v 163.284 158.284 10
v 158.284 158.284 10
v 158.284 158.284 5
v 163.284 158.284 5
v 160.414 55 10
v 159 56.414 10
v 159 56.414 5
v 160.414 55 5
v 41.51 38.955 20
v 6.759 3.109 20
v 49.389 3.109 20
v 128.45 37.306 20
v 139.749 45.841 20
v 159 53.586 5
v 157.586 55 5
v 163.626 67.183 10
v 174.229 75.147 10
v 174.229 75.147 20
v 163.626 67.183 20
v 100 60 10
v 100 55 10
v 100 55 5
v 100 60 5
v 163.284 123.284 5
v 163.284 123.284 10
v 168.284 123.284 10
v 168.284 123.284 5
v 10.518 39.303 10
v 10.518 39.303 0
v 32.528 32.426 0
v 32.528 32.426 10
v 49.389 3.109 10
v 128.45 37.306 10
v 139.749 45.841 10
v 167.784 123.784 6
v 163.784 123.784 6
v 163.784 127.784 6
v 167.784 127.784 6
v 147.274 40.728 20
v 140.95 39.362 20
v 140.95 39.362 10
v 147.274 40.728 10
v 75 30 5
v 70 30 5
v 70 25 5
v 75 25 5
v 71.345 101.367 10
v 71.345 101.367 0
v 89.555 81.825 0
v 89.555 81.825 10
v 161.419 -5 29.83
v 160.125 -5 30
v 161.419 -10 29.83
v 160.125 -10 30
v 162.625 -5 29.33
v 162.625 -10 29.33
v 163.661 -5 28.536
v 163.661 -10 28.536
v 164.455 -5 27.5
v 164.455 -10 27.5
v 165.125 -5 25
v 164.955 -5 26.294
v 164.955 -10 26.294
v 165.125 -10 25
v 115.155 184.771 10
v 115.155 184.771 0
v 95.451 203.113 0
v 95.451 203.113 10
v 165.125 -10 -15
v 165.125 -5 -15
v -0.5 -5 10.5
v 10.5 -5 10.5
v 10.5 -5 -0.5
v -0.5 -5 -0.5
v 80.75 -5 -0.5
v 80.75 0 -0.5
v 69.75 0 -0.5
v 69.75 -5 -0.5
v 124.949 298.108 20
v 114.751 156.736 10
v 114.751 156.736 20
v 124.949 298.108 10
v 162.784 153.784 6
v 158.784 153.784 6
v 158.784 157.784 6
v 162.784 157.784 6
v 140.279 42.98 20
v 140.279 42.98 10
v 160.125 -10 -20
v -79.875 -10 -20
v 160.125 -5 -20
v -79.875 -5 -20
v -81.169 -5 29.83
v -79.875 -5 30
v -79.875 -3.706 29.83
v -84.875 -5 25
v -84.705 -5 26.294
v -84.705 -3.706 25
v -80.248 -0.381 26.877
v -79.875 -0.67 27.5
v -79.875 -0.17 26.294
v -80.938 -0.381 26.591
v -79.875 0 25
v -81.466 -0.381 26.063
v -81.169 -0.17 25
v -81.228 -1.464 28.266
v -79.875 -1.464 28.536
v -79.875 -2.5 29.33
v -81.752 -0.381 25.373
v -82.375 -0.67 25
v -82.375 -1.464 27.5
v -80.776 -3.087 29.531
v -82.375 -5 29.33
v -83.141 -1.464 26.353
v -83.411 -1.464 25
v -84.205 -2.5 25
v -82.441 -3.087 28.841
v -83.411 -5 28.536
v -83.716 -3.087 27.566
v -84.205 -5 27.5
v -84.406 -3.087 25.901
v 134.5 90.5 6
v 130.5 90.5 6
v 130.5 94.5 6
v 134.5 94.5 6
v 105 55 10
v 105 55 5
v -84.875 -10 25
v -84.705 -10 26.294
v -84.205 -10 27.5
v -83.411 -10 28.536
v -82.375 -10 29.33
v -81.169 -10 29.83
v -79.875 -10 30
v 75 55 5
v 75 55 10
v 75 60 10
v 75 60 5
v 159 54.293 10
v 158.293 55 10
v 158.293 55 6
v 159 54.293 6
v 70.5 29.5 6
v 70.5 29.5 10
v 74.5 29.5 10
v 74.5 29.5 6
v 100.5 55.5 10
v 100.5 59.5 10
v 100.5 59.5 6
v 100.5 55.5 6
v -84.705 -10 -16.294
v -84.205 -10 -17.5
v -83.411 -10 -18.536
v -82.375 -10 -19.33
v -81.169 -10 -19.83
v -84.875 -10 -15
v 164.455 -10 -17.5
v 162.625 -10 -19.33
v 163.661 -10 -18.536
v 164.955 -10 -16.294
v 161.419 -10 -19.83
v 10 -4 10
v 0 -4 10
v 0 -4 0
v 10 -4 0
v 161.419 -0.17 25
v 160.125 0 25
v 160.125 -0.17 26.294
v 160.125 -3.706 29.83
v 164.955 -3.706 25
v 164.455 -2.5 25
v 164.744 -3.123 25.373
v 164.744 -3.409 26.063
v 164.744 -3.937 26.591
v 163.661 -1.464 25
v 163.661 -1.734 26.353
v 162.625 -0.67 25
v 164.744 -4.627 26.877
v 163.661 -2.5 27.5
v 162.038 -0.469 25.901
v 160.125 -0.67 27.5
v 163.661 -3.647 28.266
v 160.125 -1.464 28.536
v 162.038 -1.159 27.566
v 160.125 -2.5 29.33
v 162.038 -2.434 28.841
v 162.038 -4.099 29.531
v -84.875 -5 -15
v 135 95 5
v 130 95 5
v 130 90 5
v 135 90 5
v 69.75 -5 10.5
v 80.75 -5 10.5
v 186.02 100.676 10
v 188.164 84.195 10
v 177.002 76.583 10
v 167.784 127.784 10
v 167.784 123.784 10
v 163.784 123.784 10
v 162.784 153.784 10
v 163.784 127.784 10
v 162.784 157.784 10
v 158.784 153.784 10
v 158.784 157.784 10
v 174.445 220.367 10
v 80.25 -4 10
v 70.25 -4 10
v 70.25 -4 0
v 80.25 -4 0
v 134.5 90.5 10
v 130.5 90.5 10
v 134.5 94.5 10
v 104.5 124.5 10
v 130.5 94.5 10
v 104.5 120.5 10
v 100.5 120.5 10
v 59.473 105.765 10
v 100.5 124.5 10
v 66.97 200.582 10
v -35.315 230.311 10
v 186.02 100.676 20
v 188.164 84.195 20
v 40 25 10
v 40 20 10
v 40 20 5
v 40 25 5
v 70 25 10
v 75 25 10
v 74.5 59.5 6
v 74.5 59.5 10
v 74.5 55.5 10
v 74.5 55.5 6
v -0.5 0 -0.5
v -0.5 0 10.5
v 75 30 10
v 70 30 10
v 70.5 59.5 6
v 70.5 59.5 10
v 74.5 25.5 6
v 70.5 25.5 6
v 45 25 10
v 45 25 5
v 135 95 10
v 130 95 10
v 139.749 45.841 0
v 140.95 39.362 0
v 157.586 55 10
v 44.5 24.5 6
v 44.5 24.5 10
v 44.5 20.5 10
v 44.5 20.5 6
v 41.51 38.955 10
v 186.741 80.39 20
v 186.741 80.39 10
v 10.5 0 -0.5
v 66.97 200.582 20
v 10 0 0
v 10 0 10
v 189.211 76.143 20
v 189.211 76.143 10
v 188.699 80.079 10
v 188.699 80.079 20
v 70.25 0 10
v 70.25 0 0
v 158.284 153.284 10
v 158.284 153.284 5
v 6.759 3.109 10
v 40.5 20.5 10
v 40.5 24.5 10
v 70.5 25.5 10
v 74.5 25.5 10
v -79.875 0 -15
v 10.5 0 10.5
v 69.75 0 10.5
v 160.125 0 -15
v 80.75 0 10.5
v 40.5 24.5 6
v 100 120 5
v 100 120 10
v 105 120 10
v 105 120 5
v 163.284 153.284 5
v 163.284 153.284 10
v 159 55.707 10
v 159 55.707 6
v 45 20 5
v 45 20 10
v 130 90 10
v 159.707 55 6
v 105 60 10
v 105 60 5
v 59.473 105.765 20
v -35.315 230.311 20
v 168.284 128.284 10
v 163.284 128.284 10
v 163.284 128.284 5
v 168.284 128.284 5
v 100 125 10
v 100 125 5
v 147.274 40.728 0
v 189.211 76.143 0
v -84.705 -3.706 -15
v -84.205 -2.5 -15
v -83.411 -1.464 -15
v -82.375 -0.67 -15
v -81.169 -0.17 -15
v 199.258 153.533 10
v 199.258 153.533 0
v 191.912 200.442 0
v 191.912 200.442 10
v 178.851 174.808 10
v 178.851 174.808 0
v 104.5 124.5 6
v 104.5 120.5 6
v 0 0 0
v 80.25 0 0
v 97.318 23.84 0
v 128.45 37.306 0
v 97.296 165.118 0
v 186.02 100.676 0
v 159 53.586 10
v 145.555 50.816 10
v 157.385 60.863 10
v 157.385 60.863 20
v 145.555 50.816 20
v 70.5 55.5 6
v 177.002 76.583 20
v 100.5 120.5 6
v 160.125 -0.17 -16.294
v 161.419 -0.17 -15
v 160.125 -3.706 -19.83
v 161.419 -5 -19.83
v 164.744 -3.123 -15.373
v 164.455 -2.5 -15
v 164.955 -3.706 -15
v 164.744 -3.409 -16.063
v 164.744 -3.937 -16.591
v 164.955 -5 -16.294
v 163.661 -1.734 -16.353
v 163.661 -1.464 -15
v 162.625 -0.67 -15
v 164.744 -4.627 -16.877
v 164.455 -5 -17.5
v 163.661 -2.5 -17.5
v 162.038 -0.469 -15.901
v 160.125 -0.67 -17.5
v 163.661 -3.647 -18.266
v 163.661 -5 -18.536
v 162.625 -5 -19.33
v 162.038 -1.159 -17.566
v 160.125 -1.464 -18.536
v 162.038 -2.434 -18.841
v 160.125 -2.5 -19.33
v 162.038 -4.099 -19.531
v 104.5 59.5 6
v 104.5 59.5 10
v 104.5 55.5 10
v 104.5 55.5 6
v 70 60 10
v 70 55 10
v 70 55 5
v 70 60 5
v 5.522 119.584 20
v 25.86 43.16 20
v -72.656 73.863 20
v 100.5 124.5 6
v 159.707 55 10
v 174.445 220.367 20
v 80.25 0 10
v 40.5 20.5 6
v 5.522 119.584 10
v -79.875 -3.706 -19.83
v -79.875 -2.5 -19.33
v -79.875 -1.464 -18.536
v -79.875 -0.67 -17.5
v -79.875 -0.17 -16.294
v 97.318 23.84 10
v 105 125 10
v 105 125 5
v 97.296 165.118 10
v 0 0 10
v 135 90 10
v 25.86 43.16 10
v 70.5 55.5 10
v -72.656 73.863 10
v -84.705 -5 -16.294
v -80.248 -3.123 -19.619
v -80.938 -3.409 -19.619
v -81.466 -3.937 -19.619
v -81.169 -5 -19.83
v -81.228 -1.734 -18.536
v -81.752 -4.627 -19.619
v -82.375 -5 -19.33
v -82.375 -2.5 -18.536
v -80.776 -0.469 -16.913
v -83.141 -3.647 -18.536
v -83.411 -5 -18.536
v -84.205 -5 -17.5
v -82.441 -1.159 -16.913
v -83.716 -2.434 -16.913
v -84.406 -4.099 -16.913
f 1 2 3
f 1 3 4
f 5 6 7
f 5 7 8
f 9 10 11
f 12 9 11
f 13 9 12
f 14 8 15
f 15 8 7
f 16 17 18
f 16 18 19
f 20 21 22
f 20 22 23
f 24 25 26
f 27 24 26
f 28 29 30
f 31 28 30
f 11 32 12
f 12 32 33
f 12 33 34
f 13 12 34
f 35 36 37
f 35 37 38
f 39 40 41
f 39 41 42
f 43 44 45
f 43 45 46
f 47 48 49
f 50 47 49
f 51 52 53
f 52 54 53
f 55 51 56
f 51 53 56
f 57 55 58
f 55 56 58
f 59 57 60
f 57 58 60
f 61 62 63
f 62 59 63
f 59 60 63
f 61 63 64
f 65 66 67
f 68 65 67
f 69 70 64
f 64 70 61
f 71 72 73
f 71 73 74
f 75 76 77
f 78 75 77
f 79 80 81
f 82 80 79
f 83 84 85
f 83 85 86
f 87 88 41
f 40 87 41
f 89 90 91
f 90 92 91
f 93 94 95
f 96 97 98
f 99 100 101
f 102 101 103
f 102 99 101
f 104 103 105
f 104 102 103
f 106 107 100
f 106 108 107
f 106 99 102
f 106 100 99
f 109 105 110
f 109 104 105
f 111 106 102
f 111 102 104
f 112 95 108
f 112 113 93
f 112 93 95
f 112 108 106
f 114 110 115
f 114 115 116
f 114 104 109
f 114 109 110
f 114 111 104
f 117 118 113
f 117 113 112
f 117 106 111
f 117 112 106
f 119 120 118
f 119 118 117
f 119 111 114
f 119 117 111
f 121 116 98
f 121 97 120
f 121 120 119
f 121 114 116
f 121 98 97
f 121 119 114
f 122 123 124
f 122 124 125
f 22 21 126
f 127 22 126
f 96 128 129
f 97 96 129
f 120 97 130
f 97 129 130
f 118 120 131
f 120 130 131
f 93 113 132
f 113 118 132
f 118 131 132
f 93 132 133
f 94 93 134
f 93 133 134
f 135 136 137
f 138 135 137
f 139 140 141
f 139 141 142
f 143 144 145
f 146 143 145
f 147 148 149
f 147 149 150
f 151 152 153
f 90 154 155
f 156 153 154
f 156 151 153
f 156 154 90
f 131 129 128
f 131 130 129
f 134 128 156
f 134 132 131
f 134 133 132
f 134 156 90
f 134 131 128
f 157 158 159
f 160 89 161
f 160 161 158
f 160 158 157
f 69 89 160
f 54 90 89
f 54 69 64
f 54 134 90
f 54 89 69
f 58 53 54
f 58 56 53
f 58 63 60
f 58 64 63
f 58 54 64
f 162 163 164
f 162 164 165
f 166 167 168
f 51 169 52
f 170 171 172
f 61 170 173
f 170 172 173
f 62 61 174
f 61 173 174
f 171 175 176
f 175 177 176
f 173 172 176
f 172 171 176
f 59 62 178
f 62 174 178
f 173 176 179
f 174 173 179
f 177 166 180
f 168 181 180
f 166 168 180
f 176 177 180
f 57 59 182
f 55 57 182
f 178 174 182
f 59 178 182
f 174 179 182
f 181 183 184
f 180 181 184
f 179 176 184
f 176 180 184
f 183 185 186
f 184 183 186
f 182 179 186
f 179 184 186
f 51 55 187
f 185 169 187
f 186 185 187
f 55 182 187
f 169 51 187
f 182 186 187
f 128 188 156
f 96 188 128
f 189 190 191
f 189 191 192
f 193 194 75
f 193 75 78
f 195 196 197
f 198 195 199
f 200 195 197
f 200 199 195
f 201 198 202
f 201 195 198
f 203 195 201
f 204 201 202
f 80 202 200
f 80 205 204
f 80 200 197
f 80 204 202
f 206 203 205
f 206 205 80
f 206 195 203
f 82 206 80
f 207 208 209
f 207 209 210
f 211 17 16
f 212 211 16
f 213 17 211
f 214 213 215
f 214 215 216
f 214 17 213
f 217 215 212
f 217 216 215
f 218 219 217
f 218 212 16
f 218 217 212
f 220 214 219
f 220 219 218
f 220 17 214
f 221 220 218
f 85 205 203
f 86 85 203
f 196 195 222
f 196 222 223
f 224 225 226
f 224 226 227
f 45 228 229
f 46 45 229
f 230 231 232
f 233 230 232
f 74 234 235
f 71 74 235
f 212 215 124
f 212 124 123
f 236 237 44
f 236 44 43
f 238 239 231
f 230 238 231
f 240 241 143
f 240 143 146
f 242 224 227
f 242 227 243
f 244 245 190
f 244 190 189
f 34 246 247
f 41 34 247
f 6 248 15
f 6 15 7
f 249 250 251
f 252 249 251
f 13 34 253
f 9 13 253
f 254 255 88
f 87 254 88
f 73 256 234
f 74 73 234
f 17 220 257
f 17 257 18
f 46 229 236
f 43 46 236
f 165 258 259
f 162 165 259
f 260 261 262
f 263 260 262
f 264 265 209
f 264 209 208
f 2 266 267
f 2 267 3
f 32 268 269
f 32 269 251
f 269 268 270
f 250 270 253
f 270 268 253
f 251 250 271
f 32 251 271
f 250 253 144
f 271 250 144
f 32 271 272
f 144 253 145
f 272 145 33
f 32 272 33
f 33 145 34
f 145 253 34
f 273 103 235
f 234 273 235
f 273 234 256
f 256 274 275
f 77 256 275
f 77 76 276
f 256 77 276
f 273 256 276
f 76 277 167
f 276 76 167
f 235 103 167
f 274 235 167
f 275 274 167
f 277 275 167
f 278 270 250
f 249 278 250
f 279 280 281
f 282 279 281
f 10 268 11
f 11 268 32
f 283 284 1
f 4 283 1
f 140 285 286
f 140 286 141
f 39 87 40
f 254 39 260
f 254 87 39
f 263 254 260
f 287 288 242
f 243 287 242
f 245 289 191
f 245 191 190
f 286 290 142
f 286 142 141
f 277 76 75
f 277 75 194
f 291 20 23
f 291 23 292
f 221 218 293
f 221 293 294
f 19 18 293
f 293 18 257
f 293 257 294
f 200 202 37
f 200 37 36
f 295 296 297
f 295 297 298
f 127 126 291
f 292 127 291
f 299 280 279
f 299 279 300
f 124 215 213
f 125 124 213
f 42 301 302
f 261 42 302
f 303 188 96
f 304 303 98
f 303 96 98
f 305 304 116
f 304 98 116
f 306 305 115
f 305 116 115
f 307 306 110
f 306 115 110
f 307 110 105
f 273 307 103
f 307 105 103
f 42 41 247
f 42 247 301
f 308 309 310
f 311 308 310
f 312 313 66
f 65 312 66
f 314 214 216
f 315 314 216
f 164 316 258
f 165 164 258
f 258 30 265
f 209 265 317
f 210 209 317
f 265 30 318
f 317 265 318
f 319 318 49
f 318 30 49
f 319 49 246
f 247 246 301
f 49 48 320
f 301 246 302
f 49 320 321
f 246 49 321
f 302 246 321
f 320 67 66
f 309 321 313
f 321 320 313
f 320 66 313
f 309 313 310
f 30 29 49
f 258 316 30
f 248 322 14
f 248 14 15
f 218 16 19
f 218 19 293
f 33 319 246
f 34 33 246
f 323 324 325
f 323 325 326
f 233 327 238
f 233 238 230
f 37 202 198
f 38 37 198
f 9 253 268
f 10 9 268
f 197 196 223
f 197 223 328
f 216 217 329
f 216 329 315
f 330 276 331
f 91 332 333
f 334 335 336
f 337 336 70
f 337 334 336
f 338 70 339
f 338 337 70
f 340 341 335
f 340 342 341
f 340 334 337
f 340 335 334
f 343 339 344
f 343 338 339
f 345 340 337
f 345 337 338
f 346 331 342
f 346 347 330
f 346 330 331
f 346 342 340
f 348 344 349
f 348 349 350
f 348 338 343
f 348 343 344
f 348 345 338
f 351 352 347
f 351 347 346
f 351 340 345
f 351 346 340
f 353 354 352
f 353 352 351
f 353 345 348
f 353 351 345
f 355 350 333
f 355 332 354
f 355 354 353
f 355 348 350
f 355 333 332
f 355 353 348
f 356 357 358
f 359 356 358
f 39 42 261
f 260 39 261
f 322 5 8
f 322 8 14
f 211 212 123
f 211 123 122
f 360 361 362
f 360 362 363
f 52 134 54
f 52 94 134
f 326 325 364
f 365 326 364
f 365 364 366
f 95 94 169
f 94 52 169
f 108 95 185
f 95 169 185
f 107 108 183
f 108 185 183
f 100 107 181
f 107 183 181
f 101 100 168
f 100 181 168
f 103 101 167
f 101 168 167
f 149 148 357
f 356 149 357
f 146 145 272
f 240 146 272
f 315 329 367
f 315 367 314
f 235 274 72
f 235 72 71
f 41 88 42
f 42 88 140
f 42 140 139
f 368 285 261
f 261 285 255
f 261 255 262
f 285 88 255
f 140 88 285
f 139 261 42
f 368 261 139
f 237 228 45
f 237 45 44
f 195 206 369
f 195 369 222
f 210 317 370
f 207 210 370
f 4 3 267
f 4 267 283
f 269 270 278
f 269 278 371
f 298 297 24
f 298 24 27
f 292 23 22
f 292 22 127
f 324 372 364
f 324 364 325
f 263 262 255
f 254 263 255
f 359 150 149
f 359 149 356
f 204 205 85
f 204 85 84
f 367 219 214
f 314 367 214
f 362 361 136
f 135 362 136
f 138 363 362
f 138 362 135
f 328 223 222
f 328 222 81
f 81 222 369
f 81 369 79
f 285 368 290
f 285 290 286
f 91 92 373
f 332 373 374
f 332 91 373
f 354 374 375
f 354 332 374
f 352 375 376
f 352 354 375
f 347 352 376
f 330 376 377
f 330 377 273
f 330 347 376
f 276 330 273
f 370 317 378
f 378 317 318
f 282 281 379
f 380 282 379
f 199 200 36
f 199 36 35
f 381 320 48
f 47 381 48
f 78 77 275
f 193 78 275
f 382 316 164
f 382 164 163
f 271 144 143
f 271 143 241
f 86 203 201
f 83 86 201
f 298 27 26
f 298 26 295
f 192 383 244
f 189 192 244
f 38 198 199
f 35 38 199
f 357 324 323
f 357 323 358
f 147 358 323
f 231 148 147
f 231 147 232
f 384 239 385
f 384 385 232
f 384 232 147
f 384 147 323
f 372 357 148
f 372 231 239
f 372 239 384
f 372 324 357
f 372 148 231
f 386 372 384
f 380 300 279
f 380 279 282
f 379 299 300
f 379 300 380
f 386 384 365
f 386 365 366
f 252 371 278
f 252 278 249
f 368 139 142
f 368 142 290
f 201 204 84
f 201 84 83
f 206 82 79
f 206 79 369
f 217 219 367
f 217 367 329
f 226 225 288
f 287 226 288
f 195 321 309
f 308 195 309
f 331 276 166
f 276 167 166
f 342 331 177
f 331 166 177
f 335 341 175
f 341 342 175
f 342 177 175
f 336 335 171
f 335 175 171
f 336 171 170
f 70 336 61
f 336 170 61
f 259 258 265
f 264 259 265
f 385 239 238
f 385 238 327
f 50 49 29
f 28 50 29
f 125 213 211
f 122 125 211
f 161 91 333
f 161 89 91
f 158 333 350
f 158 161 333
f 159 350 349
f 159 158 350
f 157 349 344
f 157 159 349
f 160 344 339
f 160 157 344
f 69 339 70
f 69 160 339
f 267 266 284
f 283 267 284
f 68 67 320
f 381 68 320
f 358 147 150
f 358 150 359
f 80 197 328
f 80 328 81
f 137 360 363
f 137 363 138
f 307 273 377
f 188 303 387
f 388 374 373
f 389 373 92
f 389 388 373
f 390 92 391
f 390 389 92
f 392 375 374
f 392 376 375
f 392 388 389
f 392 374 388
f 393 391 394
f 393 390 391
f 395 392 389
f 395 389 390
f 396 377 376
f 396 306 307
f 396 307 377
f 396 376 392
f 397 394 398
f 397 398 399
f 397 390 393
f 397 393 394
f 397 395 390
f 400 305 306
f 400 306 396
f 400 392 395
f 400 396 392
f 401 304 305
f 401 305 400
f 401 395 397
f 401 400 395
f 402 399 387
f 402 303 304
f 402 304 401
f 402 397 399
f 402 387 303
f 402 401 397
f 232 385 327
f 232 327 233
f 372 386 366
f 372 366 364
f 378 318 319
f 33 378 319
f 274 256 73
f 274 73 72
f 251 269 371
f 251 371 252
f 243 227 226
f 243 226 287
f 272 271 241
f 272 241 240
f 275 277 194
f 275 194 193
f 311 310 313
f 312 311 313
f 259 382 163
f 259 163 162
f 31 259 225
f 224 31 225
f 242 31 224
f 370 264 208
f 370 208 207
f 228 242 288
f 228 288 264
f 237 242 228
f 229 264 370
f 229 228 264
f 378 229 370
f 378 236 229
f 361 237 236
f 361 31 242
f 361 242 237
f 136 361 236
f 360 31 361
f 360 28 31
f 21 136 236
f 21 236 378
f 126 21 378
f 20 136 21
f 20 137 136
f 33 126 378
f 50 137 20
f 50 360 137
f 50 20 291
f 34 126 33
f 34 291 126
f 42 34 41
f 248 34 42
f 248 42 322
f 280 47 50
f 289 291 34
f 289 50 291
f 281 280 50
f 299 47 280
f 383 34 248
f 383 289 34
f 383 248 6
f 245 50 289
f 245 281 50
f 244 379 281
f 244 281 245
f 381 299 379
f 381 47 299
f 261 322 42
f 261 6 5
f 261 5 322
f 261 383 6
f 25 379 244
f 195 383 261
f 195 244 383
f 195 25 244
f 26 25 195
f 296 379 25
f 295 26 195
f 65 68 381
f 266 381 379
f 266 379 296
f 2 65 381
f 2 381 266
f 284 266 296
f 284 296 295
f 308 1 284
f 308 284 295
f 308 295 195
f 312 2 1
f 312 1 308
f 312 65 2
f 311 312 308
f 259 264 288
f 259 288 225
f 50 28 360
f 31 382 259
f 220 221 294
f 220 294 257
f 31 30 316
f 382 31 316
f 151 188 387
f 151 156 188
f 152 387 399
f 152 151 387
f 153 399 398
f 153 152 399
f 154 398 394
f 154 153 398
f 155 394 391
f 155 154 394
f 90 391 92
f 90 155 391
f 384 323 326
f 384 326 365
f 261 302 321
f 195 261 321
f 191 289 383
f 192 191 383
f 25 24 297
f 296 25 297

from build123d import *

# Parameters (mm, degrees)
PAD_DEPTH       = 10
SKETCH001_W     = 10
SKETCH001_H     = 10
PAD001_DEPTH    = 4
SKETCH004_W     = 5
SKETCH004_H     = 5
POCKET001_DEPTH = 5
SKETCH002_W     = 250
SKETCH002_H     = 50
PAD002_DEPTH    = 10
SKETCH003_W     = 11
SKETCH003_H     = 11
POCKET_DEPTH    = 5
FILLET_R        = 5
PAD003_DEPTH    = 10
SKETCH006_W     = 4
SKETCH006_H     = 4
PAD004_DEPTH    = 4
PAD005_DEPTH    = 10
SKETCH008_W     = 4
SKETCH008_H     = 4
PAD006_DEPTH    = 4
PAD007_DEPTH    = 10
SKETCH011_W     = 4
SKETCH011_H     = 4
PAD008_DEPTH    = 4
PAD009_DEPTH    = 10
SKETCH013_W     = 4
SKETCH013_H     = 4
PAD010_DEPTH    = 4
PAD011_DEPTH    = 10
PAD012_DEPTH    = 4


with BuildPart() as back:
    # Sketch → Pad (new body)
    with BuildSketch(Plane.XY):
        Polygon((0, 0), (80.25, 0), (97.317845, 23.840114), (128.450433, 37.305937), (139.748692, 45.841448), (140.949624, 39.361798), (147.273744, 40.727966), (189.210872, 76.142501), (186.020187, 100.67589), (199.257871, 153.53347), (191.912222, 200.441805), (178.850915, 174.807547), (115.155403, 184.770609), (95.451347, 203.112817), (97.295665, 165.117552), (71.344506, 101.367209), (89.555289, 81.824864), (10.517598, 39.303034), (32.52839, 32.426359), align=None)
    extrude(amount=PAD_DEPTH)

    # Sketch001 (on Face12 of Pad) → Pad001 (join)
    with BuildSketch(Plane.XZ):
        with Locations((5, 5)):
            Rectangle(SKETCH001_W, SKETCH001_H)
        with Locations((75.25, 5)):
            Rectangle(SKETCH001_W, SKETCH001_H)
    extrude(amount=PAD001_DEPTH)

    # Sketch004 (on Face5 of Pad001) → Pocket001 (cut)
    with BuildSketch(Plane.XY.offset(10)):
        with Locations((42.5, 22.5)):
            Rectangle(SKETCH004_W, SKETCH004_H)
        with Locations((72.5, 27.5)):
            Rectangle(SKETCH004_W, SKETCH004_H)
        with Locations((72.5, 57.5)):
            Rectangle(SKETCH004_W, SKETCH004_H)
        with Locations((102.5, 57.5)):
            Rectangle(SKETCH004_W, SKETCH004_H)
        with Locations((102.5, 122.5)):
            Rectangle(SKETCH004_W, SKETCH004_H)
        with Locations((132.5, 92.5)):
            Rectangle(SKETCH004_W, SKETCH004_H)
        with Locations((160.784271, 155.784271)):
            Rectangle(SKETCH004_W, SKETCH004_H)
        with Locations((165.784271, 125.784271)):
            Rectangle(SKETCH004_W, SKETCH004_H)
        Polygon((157.585786, 55), (159, 56.414214), (160.414214, 55), (159, 53.585786), align=None)
    extrude(amount=-POCKET001_DEPTH, mode=Mode.SUBTRACT)


with BuildPart() as foot:
    # Sketch002 (on Face1 of ShapeBinder) → Pad002 (new body)
    with BuildSketch(Plane.XZ):
        with Locations((40.125, 5)):
            Rectangle(SKETCH002_W, SKETCH002_H)
    extrude(amount=PAD002_DEPTH)

    # Sketch003 (on Face5 of Pad002) → Pocket (cut)
    with BuildSketch(Plane(origin=(0, 0, 0), x_dir=(-1, 0, 0), z_dir=(0, 1, 0))):
        with Locations((-75.25, 5)):
            Rectangle(SKETCH003_W, SKETCH003_H)
        with Locations((-5, 5)):
            Rectangle(SKETCH003_W, SKETCH003_H)
    extrude(amount=-POCKET_DEPTH, mode=Mode.SUBTRACT)

    # Fillet
    fillet_edges = [foot.edges().sort_by_distance(p)[0] for p in [
        (-84.875, -5, 30),
        (40.125, 0, 30),
        (-84.875, 0, 5),
        (40.125, 0, -20),
        (165.125, 0, 5),
        (165.125, -5, 30),
        (165.125, -5, -20),
        (-84.875, -5, -20),
    ]]
    fillet(fillet_edges, radius=FILLET_R)


with BuildPart() as wingone:
    # Sketch005 (on Face1 of ShapeBinder001) → Pad003 (new body)
    with BuildSketch(Plane.XY.offset(10)):
        Polygon((49.38908, 3.109416), (128.450433, 37.305937), (139.748692, 45.841448), (41.509785, 38.954684), (6.75908, 3.109416), align=None)
    extrude(amount=PAD003_DEPTH)

    # Sketch006 (on Face6 of Pad003) → Pad004 (join)
    with BuildSketch(Plane(origin=(0, 0, 10), x_dir=(1, 0, 0), z_dir=(0, 0, -1))):
        with Locations((72.5, -27.5)):
            Rectangle(SKETCH006_W, SKETCH006_H)
        with Locations((42.5, -22.5)):
            Rectangle(SKETCH006_W, SKETCH006_H)
    extrude(amount=PAD004_DEPTH)


with BuildPart() as wingtwo:
    # Sketch007 (on Face1 of ShapeBinder002) → Pad005 (new body)
    with BuildSketch(Plane.XY.offset(10)):
        Polygon((157.384975, 60.862882), (145.555374, 50.816444), (25.86, 43.16), (-72.65641, 73.863308), (5.522071, 119.583739), align=None)
    extrude(amount=PAD005_DEPTH)

    # Sketch008 (on Face6 of Pad005) → Pad006 (join)
    with BuildSketch(Plane(origin=(0, 0, 10), x_dir=(1, 0, 0), z_dir=(0, 0, -1))):
        with Locations((72.5, -57.5)):
            Rectangle(SKETCH008_W, SKETCH008_H)
        with Locations((102.5, -57.5)):
            Rectangle(SKETCH008_W, SKETCH008_H)
    extrude(amount=PAD006_DEPTH)


with BuildPart() as wingthree:
    # Sketch010 (on Face1 of ShapeBinder003) → Pad007 (new body)
    with BuildSketch(Plane.XY.offset(10)):
        Polygon((174.228876, 75.147229), (163.626423, 67.182746), (59.472865, 105.764882), (-35.315048, 230.310807), (66.970392, 200.581751), align=None)
    extrude(amount=PAD007_DEPTH)

    # Sketch011 (on Face6 of Pad007) → Pad008 (join)
    with BuildSketch(Plane(origin=(0, 0, 10), x_dir=(1, 0, 0), z_dir=(0, 0, -1))):
        with Locations((132.5, -92.5)):
            Rectangle(SKETCH011_W, SKETCH011_H)
        with Locations((102.5, -122.5)):
            Rectangle(SKETCH011_W, SKETCH011_H)
    extrude(amount=PAD008_DEPTH)


with BuildPart() as wingfour:
    # Sketch012 (on Face1 of ShapeBinder004) → Pad009 (new body)
    with BuildSketch(Plane.XY.offset(10)):
        Polygon((186.020187, 100.67589), (188.163647, 84.194689), (177.00173, 76.5834), (114.750674, 156.735711), (124.949132, 298.108336), (174.444816, 220.367465), align=None)
    extrude(amount=PAD009_DEPTH)

    # Sketch013 (on Face7 of Pad009) → Pad010 (join)
    with BuildSketch(Plane(origin=(0, 0, 10), x_dir=(1, 0, 0), z_dir=(0, 0, -1))):
        with Locations((165.784271, -125.784271)):
            Rectangle(SKETCH013_W, SKETCH013_H)
        with Locations((160.784271, -155.784271)):
            Rectangle(SKETCH013_W, SKETCH013_H)
    extrude(amount=PAD010_DEPTH)


with BuildPart() as body:
    # Sketch014 (on Face1 of ShapeBinder005) → Pad011 (new body)
    with BuildSketch(Plane.XY.offset(10)):
        Polygon((189.210872, 76.142501), (188.698867, 80.079347), (186.741127, 80.390123), (140.278998, 42.980176), (140.949624, 39.361798), (147.273744, 40.727966), align=None)
    extrude(amount=PAD011_DEPTH)

    # Sketch015 (on Face7 of Pad011) → Pad012 (join)
    with BuildSketch(Plane(origin=(0, 0, 10), x_dir=(1, 0, 0), z_dir=(0, 0, -1))):
        Polygon((159, -54.292893), (159.707107, -55), (159, -55.707107), (158.292893, -55), align=None)
    extrude(amount=PAD012_DEPTH)


solid = Compound([back.part, foot.part, wingone.part, wingtwo.part, wingthree.part, wingfour.part, body.part])
